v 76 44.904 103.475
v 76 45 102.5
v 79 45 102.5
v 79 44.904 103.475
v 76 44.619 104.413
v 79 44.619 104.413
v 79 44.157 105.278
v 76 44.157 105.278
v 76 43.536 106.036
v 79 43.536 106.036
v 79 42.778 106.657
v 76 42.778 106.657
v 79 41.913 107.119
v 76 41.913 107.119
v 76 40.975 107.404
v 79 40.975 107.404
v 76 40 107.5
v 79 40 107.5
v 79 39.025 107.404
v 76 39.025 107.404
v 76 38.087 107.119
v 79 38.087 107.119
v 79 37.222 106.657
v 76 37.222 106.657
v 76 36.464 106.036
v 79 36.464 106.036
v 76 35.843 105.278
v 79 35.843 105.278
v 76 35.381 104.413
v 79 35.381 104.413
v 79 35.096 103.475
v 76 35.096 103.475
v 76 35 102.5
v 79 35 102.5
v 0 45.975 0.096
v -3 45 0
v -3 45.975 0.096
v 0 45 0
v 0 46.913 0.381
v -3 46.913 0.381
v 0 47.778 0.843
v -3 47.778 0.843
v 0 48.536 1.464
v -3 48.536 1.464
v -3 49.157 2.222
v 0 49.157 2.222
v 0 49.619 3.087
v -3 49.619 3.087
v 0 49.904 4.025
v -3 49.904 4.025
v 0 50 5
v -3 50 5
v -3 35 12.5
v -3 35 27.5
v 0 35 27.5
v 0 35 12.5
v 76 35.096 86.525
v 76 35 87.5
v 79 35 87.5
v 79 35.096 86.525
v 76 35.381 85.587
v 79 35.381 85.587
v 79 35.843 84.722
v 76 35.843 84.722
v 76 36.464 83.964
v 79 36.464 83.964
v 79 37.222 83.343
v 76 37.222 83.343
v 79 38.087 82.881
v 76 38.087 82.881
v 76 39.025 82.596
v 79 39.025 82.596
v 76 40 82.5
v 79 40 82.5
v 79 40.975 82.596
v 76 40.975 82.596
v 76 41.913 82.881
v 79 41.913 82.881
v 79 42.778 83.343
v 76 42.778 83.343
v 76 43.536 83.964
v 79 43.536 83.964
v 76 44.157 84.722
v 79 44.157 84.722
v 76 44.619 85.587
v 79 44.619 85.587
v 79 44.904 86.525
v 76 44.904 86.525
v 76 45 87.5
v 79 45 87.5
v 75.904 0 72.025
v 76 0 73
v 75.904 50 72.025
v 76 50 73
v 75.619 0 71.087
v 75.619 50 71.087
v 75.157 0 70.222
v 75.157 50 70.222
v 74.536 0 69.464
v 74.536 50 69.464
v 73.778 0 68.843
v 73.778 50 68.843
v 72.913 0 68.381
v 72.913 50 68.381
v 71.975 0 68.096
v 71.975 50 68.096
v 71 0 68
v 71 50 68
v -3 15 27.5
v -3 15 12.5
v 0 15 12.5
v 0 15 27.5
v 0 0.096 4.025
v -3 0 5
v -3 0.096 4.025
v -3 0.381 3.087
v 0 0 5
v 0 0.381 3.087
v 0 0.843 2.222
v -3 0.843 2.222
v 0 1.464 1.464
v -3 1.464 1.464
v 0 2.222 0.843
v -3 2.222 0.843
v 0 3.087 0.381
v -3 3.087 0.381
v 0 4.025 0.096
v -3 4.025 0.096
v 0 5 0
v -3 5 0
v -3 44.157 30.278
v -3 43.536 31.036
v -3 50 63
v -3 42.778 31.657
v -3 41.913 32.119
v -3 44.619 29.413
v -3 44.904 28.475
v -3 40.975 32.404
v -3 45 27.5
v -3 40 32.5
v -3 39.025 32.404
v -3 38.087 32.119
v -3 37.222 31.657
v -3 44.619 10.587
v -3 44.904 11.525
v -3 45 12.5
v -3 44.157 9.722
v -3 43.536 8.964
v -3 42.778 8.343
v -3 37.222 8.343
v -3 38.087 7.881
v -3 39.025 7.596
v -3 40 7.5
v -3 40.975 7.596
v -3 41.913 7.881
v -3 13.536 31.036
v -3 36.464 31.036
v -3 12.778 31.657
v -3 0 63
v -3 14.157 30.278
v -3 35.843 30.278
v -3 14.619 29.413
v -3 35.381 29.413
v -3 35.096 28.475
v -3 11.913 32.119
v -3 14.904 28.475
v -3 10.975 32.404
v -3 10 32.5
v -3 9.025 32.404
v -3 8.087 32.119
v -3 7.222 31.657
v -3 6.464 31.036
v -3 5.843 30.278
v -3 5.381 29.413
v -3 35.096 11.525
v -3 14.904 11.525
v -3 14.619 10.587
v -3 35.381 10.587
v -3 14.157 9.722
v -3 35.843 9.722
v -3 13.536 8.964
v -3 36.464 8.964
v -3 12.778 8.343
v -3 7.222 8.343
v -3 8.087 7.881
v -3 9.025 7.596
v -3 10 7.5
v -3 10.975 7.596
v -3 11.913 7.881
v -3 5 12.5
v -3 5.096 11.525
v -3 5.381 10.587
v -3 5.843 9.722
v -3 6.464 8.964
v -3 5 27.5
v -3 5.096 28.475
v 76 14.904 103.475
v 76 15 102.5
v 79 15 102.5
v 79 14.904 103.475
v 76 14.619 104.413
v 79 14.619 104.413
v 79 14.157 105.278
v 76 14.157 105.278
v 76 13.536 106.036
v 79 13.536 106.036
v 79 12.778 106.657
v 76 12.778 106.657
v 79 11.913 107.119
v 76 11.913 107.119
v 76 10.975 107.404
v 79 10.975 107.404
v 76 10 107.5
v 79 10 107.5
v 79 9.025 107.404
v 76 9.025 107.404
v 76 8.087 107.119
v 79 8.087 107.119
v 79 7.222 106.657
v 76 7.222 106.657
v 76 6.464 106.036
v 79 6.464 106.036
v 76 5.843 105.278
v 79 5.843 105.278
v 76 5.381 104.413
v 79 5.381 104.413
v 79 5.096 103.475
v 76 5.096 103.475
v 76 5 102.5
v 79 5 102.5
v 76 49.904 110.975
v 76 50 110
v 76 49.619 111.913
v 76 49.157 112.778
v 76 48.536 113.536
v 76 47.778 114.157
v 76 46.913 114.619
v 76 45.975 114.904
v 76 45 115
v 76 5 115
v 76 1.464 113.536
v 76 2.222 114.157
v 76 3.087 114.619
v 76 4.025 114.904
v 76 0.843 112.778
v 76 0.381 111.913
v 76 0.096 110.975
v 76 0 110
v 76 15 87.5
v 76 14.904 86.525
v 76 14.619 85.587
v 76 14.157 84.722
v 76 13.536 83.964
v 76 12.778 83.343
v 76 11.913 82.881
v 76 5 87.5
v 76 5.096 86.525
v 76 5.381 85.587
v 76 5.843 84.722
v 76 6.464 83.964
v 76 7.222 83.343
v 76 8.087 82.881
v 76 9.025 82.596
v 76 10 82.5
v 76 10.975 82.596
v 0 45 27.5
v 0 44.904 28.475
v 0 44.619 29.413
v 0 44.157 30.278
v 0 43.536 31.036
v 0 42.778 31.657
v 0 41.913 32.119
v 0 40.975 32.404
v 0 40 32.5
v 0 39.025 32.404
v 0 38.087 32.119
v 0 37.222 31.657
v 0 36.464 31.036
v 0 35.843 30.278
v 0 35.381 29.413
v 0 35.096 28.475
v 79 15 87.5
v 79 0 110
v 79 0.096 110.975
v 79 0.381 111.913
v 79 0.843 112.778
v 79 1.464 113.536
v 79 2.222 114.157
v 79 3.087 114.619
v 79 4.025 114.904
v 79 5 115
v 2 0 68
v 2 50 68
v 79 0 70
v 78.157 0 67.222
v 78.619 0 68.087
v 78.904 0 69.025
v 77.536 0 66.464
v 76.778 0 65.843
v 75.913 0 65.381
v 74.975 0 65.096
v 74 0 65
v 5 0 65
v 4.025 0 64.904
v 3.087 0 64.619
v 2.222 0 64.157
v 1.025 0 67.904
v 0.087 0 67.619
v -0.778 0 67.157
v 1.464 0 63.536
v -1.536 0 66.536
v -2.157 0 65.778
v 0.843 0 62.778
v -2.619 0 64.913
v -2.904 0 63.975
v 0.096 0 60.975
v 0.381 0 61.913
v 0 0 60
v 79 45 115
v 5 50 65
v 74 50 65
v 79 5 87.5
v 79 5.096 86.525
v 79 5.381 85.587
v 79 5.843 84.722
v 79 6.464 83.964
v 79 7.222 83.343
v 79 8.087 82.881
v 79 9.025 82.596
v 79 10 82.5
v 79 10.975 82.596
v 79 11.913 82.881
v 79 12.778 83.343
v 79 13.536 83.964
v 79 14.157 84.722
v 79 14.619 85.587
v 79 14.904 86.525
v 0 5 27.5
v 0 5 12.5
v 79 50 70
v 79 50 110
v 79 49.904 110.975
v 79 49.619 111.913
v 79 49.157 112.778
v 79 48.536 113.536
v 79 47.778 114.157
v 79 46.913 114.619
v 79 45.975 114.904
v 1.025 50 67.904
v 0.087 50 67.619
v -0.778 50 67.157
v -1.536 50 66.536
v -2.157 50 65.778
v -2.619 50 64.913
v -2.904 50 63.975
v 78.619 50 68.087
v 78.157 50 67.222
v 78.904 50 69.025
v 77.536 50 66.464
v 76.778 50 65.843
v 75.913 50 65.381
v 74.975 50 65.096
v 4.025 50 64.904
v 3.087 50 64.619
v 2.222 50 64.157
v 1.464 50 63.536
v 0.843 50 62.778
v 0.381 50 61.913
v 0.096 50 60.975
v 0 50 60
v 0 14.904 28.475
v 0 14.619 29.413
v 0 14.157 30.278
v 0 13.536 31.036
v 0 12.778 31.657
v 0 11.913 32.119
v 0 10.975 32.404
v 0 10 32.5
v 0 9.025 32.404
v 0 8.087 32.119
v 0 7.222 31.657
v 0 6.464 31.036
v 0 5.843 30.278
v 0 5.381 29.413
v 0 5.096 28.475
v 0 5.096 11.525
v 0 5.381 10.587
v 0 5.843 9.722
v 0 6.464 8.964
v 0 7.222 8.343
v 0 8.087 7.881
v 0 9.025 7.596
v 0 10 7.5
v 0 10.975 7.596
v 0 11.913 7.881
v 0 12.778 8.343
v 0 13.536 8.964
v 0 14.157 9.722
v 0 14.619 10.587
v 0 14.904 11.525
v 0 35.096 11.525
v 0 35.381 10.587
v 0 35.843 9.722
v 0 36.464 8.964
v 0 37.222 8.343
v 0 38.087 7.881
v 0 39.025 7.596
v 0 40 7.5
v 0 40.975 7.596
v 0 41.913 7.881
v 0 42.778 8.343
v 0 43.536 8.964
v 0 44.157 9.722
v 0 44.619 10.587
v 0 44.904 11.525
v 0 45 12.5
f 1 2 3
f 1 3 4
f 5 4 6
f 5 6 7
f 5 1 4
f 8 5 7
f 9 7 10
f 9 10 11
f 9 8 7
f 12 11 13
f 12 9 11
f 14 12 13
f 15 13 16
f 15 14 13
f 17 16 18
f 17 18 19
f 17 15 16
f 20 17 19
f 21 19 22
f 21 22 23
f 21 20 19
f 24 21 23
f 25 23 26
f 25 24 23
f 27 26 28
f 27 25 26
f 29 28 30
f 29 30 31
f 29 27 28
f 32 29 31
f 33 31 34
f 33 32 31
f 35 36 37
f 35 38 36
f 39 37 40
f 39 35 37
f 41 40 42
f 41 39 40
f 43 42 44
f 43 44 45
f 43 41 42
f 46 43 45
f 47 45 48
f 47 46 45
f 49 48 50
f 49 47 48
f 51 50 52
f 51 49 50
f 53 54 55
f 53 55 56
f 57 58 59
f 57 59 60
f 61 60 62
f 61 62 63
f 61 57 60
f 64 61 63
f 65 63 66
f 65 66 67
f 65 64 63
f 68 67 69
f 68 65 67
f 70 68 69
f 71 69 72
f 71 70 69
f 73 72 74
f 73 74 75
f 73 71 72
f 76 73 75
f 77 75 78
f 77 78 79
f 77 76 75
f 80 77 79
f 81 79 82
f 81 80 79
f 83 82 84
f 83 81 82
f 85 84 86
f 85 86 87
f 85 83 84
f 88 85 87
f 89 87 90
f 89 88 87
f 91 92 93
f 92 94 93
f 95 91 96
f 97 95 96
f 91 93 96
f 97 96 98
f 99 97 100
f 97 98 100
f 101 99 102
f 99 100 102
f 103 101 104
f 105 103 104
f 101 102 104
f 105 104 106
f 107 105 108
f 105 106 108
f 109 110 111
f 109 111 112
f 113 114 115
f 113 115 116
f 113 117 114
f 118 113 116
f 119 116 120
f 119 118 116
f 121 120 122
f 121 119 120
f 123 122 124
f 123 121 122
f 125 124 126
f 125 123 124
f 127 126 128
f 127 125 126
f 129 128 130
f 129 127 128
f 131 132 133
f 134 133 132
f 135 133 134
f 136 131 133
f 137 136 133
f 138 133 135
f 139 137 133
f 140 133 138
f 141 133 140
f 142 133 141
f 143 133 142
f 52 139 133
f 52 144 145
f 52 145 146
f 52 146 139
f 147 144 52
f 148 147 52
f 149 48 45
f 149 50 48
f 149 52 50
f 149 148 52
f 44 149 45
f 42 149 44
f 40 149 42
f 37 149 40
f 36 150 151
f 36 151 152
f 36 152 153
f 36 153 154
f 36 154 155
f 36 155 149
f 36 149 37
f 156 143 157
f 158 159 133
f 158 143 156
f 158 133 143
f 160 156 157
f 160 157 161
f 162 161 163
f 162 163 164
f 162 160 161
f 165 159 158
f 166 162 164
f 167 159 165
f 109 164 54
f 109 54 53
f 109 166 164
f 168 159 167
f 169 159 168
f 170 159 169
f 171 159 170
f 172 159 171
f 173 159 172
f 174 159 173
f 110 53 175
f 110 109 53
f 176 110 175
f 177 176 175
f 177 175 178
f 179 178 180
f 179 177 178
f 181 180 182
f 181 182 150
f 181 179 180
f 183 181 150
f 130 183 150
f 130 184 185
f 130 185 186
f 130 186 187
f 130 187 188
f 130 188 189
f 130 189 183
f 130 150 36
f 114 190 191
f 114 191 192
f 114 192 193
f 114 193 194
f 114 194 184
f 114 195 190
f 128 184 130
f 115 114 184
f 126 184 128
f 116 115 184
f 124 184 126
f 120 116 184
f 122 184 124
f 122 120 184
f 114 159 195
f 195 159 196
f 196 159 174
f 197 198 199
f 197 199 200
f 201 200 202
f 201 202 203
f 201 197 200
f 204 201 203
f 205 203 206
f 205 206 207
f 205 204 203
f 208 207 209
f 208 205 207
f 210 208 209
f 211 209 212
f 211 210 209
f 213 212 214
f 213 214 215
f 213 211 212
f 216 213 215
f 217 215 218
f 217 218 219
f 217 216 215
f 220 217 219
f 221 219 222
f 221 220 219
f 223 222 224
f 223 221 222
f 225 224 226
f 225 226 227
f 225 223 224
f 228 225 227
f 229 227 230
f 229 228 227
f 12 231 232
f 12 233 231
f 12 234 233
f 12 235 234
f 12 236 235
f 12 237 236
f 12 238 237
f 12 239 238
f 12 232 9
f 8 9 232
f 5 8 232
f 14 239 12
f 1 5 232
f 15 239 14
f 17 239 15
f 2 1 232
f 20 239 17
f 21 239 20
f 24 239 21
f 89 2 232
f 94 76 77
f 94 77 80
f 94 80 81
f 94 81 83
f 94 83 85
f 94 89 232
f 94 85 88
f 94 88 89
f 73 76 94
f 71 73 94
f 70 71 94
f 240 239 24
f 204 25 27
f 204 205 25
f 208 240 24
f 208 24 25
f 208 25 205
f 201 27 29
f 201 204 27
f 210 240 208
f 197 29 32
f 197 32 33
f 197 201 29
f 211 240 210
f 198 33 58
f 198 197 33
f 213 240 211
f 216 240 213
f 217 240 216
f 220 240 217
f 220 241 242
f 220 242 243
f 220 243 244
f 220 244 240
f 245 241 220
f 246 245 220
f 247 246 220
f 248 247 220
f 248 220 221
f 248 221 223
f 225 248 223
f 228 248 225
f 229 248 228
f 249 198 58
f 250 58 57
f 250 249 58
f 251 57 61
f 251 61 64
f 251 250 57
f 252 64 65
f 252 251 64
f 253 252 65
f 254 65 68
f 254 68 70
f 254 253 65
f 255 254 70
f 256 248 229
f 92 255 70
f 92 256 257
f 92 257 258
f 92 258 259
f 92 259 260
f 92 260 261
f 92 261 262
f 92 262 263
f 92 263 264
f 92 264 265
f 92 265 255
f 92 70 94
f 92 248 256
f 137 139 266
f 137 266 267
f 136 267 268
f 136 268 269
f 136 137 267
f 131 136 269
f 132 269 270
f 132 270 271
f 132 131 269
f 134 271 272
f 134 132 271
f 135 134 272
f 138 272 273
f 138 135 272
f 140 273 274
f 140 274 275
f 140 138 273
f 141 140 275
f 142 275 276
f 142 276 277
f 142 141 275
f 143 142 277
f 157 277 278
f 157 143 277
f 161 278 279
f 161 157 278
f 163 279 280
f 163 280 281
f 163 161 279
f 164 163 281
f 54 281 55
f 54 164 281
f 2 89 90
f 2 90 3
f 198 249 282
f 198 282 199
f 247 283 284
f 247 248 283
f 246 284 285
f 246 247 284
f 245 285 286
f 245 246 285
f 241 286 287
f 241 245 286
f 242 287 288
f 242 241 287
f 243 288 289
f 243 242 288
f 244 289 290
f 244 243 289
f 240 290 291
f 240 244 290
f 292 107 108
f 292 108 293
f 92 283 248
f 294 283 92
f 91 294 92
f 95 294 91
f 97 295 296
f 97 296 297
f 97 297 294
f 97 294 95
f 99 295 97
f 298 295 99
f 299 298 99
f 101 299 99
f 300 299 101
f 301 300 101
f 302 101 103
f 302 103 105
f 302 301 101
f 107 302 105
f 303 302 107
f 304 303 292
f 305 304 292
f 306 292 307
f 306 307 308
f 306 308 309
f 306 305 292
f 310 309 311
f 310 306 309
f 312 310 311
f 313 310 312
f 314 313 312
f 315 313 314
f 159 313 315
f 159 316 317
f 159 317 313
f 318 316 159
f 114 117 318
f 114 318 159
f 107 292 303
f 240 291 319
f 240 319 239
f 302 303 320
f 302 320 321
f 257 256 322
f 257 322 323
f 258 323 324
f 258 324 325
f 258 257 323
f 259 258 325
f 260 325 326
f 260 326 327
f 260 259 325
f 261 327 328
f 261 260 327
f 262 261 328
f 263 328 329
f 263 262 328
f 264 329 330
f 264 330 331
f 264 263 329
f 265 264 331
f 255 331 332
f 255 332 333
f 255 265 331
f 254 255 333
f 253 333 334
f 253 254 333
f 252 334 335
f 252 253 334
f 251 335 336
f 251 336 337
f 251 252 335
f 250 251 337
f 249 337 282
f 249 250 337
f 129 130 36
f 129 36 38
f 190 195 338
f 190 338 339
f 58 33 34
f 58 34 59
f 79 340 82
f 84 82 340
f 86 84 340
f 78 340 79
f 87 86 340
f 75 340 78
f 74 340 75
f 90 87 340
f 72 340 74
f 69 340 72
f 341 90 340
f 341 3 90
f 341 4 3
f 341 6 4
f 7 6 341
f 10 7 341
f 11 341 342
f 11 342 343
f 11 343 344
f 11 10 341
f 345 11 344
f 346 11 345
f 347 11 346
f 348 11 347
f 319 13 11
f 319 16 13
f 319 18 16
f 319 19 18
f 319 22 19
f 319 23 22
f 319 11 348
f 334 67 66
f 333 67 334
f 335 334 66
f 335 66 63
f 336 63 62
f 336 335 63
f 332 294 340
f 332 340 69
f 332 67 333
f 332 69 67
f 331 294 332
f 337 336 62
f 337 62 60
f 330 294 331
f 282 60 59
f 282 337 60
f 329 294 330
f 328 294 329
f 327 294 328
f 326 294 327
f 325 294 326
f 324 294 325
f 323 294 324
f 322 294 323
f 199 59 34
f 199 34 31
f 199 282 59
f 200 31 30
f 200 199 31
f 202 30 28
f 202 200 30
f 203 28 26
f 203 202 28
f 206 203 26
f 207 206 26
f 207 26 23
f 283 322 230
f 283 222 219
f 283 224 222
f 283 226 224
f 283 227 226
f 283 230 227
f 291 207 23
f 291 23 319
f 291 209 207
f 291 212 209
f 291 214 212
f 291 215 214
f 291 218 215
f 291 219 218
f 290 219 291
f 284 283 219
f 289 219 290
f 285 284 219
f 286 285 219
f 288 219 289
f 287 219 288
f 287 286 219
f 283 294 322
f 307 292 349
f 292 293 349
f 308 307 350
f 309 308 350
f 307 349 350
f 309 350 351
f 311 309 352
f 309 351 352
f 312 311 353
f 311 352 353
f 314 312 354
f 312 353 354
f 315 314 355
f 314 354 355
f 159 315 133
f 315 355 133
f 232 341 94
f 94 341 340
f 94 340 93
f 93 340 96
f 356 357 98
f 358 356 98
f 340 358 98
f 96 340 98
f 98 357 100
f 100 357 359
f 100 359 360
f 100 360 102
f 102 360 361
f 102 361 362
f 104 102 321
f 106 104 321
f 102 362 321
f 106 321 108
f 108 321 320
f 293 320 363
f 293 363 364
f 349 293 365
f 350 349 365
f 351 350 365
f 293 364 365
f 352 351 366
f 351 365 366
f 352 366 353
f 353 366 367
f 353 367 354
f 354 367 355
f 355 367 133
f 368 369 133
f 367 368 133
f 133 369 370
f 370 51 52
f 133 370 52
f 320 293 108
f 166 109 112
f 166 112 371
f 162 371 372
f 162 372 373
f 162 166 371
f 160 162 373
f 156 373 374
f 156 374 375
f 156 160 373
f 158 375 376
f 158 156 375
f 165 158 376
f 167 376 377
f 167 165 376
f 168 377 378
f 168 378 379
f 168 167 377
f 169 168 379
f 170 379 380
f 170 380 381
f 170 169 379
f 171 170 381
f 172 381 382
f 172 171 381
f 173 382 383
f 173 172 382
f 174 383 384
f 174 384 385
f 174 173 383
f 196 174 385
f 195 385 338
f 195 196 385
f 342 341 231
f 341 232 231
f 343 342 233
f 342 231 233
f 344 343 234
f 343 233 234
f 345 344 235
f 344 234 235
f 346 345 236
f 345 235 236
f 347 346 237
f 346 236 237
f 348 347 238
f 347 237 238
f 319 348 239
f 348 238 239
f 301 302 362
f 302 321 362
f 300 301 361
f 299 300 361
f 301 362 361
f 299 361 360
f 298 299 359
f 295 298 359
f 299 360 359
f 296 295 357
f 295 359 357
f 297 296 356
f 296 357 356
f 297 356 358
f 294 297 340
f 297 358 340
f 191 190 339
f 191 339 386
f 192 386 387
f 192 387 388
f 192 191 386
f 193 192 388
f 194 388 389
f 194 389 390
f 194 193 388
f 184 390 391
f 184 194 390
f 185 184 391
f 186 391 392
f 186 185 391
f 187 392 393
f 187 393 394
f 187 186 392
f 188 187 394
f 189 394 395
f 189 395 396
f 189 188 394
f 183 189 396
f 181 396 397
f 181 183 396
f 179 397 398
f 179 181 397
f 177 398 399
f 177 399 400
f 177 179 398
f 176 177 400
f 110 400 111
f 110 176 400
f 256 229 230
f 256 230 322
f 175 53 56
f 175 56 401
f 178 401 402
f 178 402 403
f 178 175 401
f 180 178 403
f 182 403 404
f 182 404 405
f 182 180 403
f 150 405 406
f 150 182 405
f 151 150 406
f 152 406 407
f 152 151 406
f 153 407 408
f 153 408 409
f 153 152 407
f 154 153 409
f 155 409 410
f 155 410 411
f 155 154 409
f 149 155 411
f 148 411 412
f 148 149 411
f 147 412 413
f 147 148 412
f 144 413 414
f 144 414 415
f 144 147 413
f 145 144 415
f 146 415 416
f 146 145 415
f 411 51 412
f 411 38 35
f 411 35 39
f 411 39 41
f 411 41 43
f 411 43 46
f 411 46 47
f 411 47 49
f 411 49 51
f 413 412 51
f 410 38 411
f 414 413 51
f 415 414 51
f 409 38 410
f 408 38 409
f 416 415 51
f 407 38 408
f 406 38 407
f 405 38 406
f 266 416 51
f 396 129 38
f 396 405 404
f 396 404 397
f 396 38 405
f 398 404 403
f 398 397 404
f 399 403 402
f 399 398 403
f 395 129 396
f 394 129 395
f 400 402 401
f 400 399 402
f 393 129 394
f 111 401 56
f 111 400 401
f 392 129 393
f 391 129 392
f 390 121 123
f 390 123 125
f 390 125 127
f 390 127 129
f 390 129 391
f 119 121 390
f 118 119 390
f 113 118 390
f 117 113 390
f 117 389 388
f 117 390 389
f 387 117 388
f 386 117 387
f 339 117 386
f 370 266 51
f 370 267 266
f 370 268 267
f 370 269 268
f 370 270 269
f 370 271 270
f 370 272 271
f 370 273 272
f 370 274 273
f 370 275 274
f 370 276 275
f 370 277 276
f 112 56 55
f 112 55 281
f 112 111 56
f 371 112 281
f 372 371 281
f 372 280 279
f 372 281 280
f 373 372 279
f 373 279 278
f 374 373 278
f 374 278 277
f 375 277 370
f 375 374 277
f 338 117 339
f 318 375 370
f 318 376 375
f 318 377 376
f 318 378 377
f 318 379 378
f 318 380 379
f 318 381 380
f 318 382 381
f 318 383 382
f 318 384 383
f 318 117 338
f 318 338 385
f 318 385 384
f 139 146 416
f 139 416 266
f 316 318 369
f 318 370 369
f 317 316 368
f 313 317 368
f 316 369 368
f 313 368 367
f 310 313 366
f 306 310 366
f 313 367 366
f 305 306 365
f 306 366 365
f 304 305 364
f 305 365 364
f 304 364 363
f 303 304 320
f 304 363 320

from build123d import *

# Parameters (mm, degrees)
BOSS_EXTRUDE1_DEPTH = 50
FILLET1_R           = 5
CUT_EXTRUDE1_DEPTH  = 3
CUT_EXTRUDE2_DEPTH  = 3
FILLET2_R           = 5


with BuildPart() as part:
    # Sketch1 → Boss-Extrude1 (new body)
    with BuildSketch(Plane(origin=(0, 0, 0), x_dir=(1, 0, 0), z_dir=(0, 1, 0))):
        Polygon((0, 0), (0, -65), (79, -65), (79, -115), (76, -115), (76, -68), (-3, -68), (-3, 0), align=None)
    extrude(amount=BOSS_EXTRUDE1_DEPTH)

    # Fillet1
    fillet1_edges = [part.edges().sort_by_distance(p)[0] for p in [
        (0, 25, 65),
        (79, 25, 65),
        (76, 25, 68),
        (-3, 25, 68),
    ]]
    fillet(fillet1_edges, radius=FILLET1_R)

    # Sketch2 → Cut-Extrude1 (cut)
    with BuildSketch(Plane.ZY.offset(-76)):
        with BuildLine():
            Line((87.5, 45), (102.5, 45))
            ThreePointArc((102.5, 45), (107.5, 40), (102.5, 35))
            Line((102.5, 35), (87.5, 35))
            ThreePointArc((87.5, 35), (82.5, 40), (87.5, 45))
        make_face()
        with BuildLine():
            Line((87.5, 15), (102.5, 15))
            ThreePointArc((102.5, 15), (107.5, 10), (102.5, 5))
            Line((102.5, 5), (87.5, 5))
            ThreePointArc((87.5, 5), (82.5, 10), (87.5, 15))
        make_face()
    extrude(amount=-CUT_EXTRUDE1_DEPTH, mode=Mode.SUBTRACT)

    # Sketch3 → Cut-Extrude2 (cut)
    with BuildSketch(Plane.ZY.offset(3)):
        with BuildLine():
            Line((12.5, 45), (27.5, 45))
            ThreePointArc((27.5, 45), (32.5, 40), (27.5, 35))
            Line((27.5, 35), (12.5, 35))
            ThreePointArc((12.5, 35), (7.5, 40), (12.5, 45))
        make_face()
        with BuildLine():
            Line((12.5, 15), (27.5, 15))
            ThreePointArc((27.5, 15), (32.5, 10), (27.5, 5))
            Line((27.5, 5), (12.5, 5))
            ThreePointArc((12.5, 5), (7.5, 10), (12.5, 15))
        make_face()
    extrude(amount=-CUT_EXTRUDE2_DEPTH, mode=Mode.SUBTRACT)

    # Fillet2
    fillet2_edges = [part.edges().sort_by_distance(p)[0] for p in [
        (-1.5, 0, 0),
        (77.5, 50, 115),
        (-1.5, 50, 0),
        (77.5, 0, 115),
    ]]
    fillet(fillet2_edges, radius=FILLET2_R)


solid = part.part
